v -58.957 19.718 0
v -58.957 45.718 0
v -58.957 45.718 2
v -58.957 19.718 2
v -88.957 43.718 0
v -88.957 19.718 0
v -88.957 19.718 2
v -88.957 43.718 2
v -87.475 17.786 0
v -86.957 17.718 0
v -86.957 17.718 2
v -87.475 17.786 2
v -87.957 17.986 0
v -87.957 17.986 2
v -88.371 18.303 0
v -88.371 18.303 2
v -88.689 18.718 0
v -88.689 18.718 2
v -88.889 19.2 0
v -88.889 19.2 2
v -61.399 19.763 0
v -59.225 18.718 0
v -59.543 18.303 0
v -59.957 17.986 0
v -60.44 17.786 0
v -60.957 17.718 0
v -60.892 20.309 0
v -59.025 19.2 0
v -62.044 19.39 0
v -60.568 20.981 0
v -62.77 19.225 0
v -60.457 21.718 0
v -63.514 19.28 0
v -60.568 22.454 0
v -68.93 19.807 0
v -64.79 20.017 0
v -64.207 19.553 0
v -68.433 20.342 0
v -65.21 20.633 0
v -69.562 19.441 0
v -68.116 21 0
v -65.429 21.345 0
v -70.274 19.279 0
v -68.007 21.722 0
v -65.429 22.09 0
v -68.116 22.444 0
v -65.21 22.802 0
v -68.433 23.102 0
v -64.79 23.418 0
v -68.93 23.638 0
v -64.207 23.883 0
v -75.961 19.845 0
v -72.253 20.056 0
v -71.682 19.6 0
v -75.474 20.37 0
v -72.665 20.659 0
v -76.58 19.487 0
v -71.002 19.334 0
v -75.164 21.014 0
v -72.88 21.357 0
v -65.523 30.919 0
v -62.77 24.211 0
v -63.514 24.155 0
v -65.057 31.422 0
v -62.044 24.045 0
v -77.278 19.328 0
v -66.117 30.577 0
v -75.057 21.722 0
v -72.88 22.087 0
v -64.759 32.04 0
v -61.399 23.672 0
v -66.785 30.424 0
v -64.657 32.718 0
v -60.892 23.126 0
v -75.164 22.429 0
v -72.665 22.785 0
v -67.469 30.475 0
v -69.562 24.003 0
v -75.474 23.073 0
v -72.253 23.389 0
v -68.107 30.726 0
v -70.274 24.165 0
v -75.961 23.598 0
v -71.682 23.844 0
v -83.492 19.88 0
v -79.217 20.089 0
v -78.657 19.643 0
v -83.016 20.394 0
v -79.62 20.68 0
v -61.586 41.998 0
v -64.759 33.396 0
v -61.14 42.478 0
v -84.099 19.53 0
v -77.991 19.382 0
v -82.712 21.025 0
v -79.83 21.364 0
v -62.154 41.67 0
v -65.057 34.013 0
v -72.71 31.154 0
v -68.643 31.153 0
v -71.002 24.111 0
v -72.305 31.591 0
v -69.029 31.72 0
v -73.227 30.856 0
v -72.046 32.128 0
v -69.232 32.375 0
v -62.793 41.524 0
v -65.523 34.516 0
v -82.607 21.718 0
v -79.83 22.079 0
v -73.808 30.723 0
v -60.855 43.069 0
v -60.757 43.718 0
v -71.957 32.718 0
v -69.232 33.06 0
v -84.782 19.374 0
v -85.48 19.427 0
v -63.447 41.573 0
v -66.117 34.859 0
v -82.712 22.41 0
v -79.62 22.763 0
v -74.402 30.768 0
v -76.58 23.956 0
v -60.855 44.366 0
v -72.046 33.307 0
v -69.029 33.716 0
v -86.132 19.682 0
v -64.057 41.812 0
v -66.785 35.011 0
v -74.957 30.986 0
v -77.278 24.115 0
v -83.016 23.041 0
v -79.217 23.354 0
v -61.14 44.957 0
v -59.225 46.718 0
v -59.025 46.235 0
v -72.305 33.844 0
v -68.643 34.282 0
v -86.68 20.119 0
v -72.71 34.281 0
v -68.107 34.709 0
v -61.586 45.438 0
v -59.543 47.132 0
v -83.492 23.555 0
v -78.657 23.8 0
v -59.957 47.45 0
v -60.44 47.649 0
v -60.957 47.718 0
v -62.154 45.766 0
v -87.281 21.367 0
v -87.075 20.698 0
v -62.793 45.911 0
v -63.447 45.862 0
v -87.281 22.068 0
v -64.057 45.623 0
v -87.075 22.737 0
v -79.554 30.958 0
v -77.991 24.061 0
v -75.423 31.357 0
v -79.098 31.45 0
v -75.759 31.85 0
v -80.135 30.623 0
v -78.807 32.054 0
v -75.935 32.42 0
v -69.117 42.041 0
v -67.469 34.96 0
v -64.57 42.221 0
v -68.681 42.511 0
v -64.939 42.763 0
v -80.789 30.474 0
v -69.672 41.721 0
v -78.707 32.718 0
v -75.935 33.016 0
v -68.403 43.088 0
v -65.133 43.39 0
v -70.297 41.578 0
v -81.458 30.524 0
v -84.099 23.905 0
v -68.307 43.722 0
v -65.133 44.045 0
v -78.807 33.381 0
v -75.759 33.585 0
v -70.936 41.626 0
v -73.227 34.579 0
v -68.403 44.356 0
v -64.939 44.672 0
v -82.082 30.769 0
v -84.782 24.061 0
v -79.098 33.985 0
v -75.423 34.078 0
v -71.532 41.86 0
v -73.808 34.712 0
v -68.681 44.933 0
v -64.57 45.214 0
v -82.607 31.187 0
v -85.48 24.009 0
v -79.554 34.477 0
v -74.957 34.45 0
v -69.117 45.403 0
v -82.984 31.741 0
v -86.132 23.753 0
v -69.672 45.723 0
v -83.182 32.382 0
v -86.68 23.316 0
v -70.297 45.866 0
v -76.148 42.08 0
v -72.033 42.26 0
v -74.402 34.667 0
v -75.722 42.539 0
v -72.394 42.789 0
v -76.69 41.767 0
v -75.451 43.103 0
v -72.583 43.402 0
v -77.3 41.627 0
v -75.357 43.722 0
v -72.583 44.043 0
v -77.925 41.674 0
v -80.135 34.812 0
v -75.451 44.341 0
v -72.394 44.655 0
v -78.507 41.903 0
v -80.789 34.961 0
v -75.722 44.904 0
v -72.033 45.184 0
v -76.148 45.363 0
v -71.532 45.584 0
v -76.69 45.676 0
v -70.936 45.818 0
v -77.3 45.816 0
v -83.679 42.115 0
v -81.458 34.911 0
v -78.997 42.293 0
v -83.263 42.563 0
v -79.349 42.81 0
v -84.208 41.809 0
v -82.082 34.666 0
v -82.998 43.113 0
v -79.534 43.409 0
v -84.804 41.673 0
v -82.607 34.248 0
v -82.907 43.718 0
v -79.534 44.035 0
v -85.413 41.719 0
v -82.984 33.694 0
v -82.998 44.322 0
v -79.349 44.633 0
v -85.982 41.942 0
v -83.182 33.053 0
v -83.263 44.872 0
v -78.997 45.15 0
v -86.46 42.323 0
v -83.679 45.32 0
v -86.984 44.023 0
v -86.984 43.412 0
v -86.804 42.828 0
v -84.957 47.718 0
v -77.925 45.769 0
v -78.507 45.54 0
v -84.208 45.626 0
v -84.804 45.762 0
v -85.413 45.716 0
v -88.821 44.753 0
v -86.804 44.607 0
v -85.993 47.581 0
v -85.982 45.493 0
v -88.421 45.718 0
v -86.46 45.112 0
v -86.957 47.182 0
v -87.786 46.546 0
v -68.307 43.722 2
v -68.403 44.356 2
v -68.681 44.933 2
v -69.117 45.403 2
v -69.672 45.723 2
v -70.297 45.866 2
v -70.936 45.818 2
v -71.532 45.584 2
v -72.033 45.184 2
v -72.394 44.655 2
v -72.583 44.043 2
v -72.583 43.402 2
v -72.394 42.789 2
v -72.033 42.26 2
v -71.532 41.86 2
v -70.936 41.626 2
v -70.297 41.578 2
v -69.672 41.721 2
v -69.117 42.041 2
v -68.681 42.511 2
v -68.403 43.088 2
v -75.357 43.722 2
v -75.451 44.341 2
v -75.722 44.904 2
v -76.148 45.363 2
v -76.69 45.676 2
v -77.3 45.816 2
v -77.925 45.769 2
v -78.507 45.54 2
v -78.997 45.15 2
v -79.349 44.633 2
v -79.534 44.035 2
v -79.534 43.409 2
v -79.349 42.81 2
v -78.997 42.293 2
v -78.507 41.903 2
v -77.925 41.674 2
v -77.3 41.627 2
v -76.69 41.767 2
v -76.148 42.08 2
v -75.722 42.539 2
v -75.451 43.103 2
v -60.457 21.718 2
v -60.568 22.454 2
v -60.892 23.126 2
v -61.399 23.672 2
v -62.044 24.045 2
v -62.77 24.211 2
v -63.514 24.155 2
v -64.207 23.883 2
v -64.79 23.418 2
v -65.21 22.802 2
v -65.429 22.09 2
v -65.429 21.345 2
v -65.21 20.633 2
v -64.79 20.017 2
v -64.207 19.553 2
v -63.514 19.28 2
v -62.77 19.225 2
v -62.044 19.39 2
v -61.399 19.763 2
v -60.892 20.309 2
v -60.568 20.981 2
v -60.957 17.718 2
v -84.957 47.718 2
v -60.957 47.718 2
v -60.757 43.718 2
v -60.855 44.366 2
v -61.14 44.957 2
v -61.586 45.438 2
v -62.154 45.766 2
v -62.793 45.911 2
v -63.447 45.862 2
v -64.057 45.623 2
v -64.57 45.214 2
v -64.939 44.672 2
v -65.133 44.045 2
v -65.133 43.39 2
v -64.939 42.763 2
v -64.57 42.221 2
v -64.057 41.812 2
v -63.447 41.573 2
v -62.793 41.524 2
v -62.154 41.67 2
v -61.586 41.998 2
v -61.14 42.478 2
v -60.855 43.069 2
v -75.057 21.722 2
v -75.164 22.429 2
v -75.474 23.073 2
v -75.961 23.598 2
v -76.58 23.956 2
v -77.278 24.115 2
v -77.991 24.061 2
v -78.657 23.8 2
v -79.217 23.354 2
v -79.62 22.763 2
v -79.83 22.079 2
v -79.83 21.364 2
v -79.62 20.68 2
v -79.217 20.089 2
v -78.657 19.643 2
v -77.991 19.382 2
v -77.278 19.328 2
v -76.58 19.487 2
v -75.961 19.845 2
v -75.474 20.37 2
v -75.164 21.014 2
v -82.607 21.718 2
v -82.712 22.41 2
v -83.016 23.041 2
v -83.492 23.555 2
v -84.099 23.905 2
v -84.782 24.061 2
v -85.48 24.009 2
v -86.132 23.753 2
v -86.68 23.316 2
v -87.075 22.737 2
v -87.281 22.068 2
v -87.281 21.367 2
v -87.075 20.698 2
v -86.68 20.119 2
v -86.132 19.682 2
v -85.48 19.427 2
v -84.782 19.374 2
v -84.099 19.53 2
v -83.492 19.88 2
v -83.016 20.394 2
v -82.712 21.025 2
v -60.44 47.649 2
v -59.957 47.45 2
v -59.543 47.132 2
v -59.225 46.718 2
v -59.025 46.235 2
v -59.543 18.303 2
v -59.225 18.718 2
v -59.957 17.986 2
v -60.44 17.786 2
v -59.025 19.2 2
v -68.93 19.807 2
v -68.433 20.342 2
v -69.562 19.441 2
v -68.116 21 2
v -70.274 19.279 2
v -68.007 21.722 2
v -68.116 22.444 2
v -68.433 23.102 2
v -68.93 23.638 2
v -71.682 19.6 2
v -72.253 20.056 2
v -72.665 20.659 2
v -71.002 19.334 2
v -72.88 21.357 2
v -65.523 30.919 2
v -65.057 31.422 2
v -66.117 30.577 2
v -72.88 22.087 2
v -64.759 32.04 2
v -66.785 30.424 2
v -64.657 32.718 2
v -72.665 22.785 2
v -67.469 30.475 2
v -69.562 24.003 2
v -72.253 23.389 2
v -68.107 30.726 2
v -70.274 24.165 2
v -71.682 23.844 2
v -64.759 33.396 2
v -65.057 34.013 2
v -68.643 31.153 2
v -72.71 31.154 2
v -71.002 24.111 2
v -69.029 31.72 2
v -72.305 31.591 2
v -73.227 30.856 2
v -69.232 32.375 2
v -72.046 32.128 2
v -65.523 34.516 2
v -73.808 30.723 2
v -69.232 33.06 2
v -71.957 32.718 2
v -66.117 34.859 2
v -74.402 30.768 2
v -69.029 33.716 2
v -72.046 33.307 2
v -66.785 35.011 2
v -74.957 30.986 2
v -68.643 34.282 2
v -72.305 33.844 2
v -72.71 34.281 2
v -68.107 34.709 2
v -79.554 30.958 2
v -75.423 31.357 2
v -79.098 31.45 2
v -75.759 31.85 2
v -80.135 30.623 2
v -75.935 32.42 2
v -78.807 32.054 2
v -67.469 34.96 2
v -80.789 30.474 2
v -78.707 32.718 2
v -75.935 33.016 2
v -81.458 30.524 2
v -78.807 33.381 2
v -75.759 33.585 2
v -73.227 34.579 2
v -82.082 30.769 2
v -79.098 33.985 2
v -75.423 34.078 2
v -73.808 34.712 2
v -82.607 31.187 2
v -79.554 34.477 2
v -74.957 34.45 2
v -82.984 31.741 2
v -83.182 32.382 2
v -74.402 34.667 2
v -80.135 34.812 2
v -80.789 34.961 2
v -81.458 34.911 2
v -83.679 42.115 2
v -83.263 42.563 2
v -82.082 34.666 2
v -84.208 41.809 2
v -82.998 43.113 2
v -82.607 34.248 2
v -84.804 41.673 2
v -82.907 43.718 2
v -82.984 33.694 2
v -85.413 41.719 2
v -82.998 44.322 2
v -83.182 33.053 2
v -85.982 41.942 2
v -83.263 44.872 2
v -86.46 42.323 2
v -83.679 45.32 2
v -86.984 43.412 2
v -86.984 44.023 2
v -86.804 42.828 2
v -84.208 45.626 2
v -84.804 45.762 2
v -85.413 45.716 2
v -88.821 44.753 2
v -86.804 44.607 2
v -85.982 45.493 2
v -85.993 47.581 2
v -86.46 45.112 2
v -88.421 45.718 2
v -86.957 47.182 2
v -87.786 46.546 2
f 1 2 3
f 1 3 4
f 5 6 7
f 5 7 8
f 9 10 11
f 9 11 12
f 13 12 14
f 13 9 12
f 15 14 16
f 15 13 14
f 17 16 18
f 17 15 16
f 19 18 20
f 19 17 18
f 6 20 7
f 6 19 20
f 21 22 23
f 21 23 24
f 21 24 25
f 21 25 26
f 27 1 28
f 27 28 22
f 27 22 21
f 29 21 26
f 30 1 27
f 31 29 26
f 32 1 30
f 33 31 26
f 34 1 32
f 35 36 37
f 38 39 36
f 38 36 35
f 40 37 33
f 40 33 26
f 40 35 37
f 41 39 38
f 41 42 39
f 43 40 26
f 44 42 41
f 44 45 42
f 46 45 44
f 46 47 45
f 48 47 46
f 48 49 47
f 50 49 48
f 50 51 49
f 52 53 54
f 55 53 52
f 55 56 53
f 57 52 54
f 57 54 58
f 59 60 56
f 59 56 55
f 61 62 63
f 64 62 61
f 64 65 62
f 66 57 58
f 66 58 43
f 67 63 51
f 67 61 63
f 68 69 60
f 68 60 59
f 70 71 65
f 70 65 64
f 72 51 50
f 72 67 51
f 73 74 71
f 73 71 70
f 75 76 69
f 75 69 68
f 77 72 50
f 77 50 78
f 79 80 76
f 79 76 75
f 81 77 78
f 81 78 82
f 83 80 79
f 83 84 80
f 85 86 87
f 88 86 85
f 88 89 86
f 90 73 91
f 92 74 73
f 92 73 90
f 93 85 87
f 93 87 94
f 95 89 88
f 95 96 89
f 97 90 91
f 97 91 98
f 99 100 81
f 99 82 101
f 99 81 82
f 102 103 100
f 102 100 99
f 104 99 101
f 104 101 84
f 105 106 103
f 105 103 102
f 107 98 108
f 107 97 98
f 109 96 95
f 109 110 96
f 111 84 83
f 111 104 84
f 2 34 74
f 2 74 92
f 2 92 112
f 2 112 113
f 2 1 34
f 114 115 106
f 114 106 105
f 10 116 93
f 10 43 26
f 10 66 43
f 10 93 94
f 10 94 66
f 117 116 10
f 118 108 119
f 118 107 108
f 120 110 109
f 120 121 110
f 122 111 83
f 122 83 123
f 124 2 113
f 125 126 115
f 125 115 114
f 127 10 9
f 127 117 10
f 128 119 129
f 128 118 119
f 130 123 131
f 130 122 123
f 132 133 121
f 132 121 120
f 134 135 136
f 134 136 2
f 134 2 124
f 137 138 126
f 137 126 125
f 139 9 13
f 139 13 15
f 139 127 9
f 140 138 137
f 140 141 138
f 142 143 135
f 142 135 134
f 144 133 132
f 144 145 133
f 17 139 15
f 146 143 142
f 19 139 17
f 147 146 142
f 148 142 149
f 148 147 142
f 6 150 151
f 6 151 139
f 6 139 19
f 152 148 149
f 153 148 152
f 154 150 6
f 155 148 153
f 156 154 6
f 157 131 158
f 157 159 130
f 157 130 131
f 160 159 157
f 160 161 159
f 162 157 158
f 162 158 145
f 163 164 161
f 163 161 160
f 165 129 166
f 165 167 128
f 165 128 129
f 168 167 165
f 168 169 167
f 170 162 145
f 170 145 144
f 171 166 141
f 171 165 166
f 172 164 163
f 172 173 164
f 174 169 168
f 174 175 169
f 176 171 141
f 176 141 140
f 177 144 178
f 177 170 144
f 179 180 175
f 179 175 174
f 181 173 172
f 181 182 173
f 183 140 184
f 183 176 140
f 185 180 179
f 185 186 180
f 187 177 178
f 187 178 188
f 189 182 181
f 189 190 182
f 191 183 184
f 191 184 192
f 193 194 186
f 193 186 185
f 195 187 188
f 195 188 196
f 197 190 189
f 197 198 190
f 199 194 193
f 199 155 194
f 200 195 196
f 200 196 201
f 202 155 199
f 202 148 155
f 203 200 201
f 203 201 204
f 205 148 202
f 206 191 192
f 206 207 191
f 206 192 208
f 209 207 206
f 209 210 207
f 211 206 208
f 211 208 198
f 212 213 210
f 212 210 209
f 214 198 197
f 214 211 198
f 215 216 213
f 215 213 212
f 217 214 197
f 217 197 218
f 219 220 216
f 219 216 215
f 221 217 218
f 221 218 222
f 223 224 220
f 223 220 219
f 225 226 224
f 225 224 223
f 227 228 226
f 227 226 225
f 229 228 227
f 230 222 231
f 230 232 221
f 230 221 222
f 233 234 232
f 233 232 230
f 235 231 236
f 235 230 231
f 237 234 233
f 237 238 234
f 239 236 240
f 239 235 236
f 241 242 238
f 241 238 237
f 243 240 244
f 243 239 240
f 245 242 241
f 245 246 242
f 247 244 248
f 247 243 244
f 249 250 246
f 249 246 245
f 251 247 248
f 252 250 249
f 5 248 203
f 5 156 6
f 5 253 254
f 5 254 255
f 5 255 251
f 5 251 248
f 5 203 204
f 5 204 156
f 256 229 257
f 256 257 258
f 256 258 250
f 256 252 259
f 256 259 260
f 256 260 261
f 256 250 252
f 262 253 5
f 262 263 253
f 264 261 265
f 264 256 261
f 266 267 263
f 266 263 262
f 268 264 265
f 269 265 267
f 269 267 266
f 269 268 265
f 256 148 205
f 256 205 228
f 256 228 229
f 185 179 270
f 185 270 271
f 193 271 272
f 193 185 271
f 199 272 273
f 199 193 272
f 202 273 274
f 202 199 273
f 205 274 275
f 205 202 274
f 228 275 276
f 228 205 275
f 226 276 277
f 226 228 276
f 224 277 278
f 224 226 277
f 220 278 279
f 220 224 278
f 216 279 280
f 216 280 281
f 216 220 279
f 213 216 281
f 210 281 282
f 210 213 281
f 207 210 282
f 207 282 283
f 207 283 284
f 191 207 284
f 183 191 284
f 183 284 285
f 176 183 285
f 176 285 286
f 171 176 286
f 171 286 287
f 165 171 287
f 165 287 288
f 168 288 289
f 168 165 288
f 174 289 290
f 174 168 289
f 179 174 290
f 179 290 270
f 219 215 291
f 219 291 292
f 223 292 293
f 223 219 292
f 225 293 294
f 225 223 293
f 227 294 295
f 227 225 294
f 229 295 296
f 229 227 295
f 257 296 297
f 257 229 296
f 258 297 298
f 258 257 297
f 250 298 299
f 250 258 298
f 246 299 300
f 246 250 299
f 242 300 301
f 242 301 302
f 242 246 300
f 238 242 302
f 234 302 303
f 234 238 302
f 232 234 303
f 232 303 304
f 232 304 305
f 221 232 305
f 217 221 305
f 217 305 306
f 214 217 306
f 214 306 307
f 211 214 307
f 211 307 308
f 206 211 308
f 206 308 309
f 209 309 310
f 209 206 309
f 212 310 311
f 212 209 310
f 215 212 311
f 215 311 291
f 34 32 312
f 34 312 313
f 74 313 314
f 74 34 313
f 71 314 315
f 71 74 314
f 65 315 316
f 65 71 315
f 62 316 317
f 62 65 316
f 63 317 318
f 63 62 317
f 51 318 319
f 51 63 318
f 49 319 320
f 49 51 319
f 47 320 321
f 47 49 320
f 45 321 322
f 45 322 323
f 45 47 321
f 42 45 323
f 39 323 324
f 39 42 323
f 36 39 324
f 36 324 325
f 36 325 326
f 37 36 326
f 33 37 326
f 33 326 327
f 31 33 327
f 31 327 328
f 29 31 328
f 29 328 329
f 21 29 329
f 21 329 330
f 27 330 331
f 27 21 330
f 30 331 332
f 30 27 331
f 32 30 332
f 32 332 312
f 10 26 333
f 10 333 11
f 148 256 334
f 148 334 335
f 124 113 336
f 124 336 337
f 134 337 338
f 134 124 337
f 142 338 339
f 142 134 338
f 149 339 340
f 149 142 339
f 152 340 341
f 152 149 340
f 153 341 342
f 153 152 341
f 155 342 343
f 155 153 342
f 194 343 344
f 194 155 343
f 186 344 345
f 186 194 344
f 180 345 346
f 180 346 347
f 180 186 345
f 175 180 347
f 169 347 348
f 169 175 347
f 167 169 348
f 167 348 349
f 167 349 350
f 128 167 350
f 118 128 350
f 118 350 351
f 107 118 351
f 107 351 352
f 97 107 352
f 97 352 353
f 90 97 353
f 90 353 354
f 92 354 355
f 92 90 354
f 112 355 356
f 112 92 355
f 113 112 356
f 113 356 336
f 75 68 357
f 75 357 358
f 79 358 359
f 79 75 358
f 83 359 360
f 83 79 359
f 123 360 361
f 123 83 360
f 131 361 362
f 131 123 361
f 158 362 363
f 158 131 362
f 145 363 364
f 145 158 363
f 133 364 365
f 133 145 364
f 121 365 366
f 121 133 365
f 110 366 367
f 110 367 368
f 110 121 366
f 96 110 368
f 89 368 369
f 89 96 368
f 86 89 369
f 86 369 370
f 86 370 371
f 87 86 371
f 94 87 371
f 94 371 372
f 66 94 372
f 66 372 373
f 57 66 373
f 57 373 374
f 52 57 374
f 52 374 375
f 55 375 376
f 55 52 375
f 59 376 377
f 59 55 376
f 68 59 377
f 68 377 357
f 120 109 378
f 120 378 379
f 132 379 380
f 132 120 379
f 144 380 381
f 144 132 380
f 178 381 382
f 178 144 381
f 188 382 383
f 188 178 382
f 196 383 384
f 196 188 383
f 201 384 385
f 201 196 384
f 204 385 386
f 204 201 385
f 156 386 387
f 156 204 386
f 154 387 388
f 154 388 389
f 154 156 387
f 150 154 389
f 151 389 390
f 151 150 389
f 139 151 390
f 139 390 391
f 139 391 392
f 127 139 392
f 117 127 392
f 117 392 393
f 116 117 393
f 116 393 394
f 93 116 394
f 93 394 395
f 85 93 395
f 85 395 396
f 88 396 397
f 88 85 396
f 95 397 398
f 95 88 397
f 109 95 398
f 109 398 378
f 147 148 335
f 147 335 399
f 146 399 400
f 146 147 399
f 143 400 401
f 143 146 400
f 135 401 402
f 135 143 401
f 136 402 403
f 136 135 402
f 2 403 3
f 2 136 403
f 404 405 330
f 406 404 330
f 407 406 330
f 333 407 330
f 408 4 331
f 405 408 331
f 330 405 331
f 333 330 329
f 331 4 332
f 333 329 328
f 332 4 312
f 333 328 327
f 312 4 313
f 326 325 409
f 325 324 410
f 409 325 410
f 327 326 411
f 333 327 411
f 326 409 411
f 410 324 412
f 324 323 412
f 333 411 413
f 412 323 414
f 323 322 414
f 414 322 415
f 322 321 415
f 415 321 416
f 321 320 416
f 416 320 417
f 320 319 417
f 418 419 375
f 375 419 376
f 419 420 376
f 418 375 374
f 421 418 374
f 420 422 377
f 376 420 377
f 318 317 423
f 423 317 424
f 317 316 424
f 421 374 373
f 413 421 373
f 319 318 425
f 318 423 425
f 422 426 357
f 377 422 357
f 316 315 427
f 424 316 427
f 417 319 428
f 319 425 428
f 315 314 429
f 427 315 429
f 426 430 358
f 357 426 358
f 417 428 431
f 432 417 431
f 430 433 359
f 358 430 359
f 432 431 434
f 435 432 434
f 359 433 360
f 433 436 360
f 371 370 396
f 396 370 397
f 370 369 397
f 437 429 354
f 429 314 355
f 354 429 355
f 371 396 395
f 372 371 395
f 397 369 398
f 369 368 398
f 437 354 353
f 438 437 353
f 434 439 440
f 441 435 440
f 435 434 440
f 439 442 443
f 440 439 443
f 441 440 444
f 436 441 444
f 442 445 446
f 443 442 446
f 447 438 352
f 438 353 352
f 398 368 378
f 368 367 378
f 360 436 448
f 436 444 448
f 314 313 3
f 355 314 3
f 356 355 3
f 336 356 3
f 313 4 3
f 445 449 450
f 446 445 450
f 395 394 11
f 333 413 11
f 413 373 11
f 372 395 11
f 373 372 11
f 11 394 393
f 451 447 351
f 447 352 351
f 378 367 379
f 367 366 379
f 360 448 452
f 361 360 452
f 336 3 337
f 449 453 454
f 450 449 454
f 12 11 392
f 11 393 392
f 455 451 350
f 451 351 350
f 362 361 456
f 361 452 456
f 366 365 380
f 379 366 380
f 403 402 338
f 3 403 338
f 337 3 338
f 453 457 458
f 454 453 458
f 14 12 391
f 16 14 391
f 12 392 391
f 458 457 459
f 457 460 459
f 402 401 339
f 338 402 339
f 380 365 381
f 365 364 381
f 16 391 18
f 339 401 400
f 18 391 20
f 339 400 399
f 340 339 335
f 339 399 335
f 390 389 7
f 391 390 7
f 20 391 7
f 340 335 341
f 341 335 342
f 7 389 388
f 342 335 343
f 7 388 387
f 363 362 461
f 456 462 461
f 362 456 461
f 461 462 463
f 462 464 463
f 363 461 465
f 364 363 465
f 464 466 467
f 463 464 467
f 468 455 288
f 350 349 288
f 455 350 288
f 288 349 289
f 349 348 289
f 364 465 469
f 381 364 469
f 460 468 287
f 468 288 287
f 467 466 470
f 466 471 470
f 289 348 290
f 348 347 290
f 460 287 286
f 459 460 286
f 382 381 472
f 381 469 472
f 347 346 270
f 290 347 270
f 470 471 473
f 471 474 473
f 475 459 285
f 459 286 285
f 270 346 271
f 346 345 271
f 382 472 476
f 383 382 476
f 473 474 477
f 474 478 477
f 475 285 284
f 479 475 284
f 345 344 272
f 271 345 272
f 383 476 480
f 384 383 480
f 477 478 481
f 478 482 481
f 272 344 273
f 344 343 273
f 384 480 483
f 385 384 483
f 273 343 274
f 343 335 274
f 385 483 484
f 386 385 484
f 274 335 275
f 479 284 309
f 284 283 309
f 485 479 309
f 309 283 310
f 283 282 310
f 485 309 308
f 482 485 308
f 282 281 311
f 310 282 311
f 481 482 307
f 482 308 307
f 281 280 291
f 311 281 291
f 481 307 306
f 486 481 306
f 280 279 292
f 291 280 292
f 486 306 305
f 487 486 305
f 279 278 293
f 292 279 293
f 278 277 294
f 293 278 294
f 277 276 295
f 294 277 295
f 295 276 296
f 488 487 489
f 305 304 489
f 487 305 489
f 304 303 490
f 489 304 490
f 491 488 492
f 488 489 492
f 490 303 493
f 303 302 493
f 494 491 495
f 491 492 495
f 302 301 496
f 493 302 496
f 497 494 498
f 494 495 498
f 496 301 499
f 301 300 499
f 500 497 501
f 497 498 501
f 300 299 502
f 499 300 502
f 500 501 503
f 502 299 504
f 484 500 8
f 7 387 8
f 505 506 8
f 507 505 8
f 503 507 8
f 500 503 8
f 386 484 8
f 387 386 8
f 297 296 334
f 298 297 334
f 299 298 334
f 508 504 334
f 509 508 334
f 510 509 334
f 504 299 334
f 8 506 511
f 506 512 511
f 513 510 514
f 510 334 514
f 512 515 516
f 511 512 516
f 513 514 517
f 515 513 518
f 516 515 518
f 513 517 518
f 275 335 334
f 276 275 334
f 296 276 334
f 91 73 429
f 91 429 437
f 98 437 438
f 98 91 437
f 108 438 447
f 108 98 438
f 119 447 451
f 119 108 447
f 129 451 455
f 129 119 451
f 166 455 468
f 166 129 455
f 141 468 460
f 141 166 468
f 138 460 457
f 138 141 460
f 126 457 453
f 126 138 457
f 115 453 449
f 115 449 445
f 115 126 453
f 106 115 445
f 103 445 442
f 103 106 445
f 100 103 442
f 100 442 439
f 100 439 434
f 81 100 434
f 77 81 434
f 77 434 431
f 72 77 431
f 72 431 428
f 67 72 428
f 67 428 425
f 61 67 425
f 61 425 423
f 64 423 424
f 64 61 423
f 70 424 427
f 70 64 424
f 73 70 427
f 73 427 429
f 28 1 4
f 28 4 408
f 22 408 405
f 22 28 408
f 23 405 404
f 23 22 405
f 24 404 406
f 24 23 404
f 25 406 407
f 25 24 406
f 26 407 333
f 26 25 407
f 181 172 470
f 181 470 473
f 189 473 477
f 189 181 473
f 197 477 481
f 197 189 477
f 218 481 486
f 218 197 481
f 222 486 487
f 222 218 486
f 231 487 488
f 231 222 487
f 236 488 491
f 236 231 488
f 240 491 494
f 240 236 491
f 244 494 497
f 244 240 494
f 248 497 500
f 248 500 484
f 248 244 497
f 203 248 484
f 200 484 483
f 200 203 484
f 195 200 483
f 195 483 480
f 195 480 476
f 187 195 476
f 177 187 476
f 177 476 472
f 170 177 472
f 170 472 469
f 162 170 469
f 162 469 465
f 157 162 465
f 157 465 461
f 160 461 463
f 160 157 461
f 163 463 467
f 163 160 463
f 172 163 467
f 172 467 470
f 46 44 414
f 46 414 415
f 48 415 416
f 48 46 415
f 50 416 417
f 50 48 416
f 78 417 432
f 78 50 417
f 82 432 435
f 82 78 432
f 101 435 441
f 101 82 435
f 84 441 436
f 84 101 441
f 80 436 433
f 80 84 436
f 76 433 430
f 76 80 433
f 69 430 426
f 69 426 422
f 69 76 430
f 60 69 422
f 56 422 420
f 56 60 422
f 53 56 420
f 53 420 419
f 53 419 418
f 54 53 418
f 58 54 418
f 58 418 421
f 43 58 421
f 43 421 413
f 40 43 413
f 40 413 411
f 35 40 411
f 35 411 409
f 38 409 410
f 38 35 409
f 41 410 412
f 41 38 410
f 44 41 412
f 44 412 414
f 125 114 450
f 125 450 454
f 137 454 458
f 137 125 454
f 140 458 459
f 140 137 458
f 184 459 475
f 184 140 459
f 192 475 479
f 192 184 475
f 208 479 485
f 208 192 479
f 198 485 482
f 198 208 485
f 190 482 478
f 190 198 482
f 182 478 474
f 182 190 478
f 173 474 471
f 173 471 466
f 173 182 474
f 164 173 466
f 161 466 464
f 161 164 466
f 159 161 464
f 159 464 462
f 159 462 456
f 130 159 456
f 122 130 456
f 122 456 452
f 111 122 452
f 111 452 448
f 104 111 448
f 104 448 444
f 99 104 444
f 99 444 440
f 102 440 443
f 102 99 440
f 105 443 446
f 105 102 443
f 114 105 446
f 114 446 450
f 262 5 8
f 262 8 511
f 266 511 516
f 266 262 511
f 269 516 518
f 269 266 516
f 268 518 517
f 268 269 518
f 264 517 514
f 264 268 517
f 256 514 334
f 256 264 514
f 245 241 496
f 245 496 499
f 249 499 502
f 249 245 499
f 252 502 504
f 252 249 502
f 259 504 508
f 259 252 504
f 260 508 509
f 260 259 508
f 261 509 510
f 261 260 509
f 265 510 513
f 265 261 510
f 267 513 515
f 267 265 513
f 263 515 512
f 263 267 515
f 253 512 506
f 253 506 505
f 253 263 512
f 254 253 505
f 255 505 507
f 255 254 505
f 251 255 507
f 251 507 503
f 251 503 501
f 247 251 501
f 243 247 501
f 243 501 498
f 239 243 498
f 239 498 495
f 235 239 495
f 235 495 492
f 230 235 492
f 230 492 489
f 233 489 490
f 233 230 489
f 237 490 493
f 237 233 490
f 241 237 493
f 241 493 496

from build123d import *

# Parameters (mm, degrees)
CROQUIS1_R              = 2.2
CROQUIS1_R_2            = 2.5
CROQUIS1_R_3            = 2.35
CROQUIS1_R_4            = 2.05
CROQUIS1_R_5            = 2.1
CROQUIS1_R_6            = 2.15
CROQUIS1_R_7            = 2.4
CROQUIS1_R_8            = 2.45
CROQUIS1_R_9            = 2.25
CROQUIS1_R_10           = 2.3
CROQUIS1_R_11           = 2
SALIENTE_EXTRUIR1_DEPTH = 2


with BuildPart() as part:
    # Croquis1 → Saliente-Extruir1 (new body)
    with BuildSketch(Plane.XY):
        with BuildLine():
            Line((-84.957262486, 47.717592446), (-60.957262486, 47.717592446))
            ThreePointArc((-60.957262486, 47.717592446), (-59.543048923, 47.131806009), (-58.957262486, 45.717592446))
            Line((-58.957262486, 45.717592446), (-58.957262486, 19.717592446))
            ThreePointArc((-58.957262486, 19.717592446), (-59.543048923, 18.303378884), (-60.957262486, 17.717592446))
            Line((-60.957262486, 17.717592446), (-86.957262486, 17.717592446))
            ThreePointArc((-86.957262486, 17.717592446), (-88.371476048, 18.303378884), (-88.957262486, 19.717592446))
            Line((-88.957262486, 19.717592446), (-88.957262486, 43.717592446))
            ThreePointArc((-88.957262486, 43.717592446), (-87.78568961, 46.546019571), (-84.957262486, 47.717592446))
        make_face()
        with Locations((-62.957262486, 43.717592446)):
            Circle(CROQUIS1_R, mode=Mode.SUBTRACT)
        with Locations((-62.957262486, 21.717592446)):
            Circle(CROQUIS1_R_2, mode=Mode.SUBTRACT)
        with Locations((-84.957262486, 21.717592446)):
            Circle(CROQUIS1_R_3, mode=Mode.SUBTRACT)
        with Locations((-84.957262486, 43.717592446)):
            Circle(CROQUIS1_R_4, mode=Mode.SUBTRACT)
        with Locations((-77.457263515, 43.721521604)):
            Circle(CROQUIS1_R_5, mode=Mode.SUBTRACT)
        with Locations((-70.457261138, 43.722088276)):
            Circle(CROQUIS1_R_6, mode=Mode.SUBTRACT)
        with Locations((-77.457263515, 21.721521604)):
            Circle(CROQUIS1_R_7, mode=Mode.SUBTRACT)
        with Locations((-70.457261138, 21.722088276)):
            Circle(CROQUIS1_R_8, mode=Mode.SUBTRACT)
        with Locations((-80.957262486, 32.717592446)):
            Circle(CROQUIS1_R_9, mode=Mode.SUBTRACT)
        with Locations((-66.957262486, 32.717592446)):
            Circle(CROQUIS1_R_10, mode=Mode.SUBTRACT)
        with Locations((-73.957262486, 32.717592446)):
            Circle(CROQUIS1_R_11, mode=Mode.SUBTRACT)
    extrude(amount=SALIENTE_EXTRUIR1_DEPTH)


solid = part.part
